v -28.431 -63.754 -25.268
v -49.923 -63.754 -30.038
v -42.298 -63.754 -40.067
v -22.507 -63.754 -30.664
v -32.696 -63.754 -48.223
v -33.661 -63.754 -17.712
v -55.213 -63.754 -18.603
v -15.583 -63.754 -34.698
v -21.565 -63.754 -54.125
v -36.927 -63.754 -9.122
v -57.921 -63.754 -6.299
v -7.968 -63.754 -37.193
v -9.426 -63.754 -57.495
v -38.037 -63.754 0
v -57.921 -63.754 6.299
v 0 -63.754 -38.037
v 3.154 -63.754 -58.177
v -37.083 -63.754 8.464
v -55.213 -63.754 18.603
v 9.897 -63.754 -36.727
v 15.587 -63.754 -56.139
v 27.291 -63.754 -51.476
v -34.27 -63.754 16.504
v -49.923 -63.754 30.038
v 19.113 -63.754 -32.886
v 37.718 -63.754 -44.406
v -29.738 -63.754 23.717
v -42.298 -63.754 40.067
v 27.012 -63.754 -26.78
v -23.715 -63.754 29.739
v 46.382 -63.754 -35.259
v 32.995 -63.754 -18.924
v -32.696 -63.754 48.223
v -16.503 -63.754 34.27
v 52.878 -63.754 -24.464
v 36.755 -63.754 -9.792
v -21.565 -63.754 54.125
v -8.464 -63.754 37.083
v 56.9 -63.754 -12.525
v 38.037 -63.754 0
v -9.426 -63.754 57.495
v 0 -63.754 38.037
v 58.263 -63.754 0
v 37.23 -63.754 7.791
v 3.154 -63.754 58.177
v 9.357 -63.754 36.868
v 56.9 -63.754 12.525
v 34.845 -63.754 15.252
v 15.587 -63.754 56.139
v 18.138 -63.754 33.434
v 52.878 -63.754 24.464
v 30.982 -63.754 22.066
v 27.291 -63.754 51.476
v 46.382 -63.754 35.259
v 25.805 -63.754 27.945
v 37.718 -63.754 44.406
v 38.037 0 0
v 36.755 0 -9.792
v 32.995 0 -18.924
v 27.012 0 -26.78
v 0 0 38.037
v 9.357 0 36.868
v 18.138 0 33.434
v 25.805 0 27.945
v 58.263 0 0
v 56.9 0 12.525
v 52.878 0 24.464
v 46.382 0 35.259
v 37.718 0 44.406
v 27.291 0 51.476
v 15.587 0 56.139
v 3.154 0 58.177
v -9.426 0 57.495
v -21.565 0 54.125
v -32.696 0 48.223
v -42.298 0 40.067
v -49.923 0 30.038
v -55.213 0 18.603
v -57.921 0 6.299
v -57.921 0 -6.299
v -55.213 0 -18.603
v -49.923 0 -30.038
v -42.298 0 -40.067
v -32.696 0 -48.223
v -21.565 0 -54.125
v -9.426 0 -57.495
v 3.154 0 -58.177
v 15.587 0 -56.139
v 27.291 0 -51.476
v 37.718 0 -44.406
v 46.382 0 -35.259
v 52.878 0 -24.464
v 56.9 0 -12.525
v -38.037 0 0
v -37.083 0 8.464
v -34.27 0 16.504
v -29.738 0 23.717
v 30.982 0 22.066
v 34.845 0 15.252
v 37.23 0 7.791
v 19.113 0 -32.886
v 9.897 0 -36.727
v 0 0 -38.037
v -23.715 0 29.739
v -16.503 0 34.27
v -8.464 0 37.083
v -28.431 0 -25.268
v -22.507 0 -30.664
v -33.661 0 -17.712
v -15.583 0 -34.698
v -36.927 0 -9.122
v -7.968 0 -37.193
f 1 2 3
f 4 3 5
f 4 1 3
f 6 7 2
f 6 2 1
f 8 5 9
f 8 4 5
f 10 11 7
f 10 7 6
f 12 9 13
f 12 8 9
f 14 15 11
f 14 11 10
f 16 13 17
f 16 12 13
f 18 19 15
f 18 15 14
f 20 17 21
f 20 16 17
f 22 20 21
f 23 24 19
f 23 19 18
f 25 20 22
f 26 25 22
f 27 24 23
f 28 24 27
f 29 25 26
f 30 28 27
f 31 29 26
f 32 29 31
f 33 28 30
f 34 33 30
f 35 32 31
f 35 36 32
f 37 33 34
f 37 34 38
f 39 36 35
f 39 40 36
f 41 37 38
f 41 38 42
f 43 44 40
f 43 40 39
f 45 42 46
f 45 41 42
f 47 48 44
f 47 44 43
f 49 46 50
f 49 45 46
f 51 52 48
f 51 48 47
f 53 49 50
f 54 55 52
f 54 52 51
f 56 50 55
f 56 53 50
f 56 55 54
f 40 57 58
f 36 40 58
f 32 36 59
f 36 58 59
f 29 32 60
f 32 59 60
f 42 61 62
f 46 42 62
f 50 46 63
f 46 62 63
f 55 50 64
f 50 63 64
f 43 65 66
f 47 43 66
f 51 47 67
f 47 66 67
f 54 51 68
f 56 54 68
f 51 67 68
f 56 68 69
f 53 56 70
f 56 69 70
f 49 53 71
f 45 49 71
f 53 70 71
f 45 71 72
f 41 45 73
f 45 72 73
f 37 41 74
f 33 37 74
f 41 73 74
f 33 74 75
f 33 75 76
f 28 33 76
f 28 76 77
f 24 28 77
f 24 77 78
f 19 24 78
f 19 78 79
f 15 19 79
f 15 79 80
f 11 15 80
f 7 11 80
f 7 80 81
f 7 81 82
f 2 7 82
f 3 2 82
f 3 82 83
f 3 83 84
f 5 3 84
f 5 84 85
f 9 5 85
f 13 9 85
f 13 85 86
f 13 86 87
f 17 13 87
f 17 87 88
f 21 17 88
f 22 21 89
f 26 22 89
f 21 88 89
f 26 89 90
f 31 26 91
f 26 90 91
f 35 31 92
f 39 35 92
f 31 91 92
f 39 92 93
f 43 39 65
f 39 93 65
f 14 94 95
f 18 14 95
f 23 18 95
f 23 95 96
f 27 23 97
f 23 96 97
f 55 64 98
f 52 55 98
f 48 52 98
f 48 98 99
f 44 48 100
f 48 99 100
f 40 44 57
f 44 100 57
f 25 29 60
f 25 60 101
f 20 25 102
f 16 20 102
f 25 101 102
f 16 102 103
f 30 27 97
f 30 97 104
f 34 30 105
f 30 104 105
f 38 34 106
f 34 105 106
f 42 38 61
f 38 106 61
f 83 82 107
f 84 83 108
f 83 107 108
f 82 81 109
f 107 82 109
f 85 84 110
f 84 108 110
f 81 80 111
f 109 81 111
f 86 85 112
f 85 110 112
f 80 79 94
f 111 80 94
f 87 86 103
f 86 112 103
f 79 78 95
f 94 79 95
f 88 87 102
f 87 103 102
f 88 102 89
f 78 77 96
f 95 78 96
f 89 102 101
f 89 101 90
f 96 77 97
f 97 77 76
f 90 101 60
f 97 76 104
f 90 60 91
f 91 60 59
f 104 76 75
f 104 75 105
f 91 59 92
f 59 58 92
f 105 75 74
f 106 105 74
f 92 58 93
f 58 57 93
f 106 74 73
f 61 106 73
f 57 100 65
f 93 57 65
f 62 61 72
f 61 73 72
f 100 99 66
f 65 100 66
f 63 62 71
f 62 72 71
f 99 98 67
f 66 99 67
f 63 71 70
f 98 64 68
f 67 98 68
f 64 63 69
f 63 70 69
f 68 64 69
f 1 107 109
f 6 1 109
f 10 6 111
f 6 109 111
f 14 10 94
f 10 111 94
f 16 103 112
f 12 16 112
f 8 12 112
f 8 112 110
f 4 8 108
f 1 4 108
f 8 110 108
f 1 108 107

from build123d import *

# Parameters (mm, degrees)
F0_R     = 58.262623
F1_DEPTH = 34.544
F2_DEPTH = 63.754


with BuildPart() as f1:
    # F0 (on Front) → F1 (new body)
    with BuildSketch(Plane.XZ):
        Circle(F0_R)
        with BuildLine():
            ThreePointArc((25.805285, 27.944596), (34.845149, 15.252174), (38.036998, 0))
            ThreePointArc((38.036998, 0), (35.17286, -14.480438), (27.01178, -26.780159))
            ThreePointArc((27.01178, -26.780159), (14.631752, -35.110184), (0, -38.036998))
            ThreePointArc((0, -38.036998), (-15.583326, -34.698316), (-28.431013, -25.268374))
            ThreePointArc((-28.431013, -25.268374), (-35.55449, -13.516339), (-38.036998, 0))
            ThreePointArc((-38.036998, 0), (-35.902258, 12.56348), (-29.737655, 23.716767))
            ThreePointArc((-29.737655, 23.716767), (-16.503008, 34.270452), (0, 38.036998))
            ThreePointArc((0, 38.036998), (13.854325, 35.424156), (25.805285, 27.944596))
        make_face(mode=Mode.SUBTRACT)
    extrude(amount=F1_DEPTH)

    # F0 (on Front) → F2 (join)
    with BuildSketch(Plane.XZ):
        Circle(F0_R)
        with BuildLine():
            ThreePointArc((25.805285, 27.944596), (34.845149, 15.252174), (38.036998, 0))
            ThreePointArc((38.036998, 0), (35.17286, -14.480438), (27.01178, -26.780159))
            ThreePointArc((27.01178, -26.780159), (14.631752, -35.110184), (0, -38.036998))
            ThreePointArc((0, -38.036998), (-15.583326, -34.698316), (-28.431013, -25.268374))
            ThreePointArc((-28.431013, -25.268374), (-35.55449, -13.516339), (-38.036998, 0))
            ThreePointArc((-38.036998, 0), (-35.902258, 12.56348), (-29.737655, 23.716767))
            ThreePointArc((-29.737655, 23.716767), (-16.503008, 34.270452), (0, 38.036998))
            ThreePointArc((0, 38.036998), (13.854325, 35.424156), (25.805285, 27.944596))
        make_face(mode=Mode.SUBTRACT)
    extrude(amount=F2_DEPTH)


solid = f1.part
